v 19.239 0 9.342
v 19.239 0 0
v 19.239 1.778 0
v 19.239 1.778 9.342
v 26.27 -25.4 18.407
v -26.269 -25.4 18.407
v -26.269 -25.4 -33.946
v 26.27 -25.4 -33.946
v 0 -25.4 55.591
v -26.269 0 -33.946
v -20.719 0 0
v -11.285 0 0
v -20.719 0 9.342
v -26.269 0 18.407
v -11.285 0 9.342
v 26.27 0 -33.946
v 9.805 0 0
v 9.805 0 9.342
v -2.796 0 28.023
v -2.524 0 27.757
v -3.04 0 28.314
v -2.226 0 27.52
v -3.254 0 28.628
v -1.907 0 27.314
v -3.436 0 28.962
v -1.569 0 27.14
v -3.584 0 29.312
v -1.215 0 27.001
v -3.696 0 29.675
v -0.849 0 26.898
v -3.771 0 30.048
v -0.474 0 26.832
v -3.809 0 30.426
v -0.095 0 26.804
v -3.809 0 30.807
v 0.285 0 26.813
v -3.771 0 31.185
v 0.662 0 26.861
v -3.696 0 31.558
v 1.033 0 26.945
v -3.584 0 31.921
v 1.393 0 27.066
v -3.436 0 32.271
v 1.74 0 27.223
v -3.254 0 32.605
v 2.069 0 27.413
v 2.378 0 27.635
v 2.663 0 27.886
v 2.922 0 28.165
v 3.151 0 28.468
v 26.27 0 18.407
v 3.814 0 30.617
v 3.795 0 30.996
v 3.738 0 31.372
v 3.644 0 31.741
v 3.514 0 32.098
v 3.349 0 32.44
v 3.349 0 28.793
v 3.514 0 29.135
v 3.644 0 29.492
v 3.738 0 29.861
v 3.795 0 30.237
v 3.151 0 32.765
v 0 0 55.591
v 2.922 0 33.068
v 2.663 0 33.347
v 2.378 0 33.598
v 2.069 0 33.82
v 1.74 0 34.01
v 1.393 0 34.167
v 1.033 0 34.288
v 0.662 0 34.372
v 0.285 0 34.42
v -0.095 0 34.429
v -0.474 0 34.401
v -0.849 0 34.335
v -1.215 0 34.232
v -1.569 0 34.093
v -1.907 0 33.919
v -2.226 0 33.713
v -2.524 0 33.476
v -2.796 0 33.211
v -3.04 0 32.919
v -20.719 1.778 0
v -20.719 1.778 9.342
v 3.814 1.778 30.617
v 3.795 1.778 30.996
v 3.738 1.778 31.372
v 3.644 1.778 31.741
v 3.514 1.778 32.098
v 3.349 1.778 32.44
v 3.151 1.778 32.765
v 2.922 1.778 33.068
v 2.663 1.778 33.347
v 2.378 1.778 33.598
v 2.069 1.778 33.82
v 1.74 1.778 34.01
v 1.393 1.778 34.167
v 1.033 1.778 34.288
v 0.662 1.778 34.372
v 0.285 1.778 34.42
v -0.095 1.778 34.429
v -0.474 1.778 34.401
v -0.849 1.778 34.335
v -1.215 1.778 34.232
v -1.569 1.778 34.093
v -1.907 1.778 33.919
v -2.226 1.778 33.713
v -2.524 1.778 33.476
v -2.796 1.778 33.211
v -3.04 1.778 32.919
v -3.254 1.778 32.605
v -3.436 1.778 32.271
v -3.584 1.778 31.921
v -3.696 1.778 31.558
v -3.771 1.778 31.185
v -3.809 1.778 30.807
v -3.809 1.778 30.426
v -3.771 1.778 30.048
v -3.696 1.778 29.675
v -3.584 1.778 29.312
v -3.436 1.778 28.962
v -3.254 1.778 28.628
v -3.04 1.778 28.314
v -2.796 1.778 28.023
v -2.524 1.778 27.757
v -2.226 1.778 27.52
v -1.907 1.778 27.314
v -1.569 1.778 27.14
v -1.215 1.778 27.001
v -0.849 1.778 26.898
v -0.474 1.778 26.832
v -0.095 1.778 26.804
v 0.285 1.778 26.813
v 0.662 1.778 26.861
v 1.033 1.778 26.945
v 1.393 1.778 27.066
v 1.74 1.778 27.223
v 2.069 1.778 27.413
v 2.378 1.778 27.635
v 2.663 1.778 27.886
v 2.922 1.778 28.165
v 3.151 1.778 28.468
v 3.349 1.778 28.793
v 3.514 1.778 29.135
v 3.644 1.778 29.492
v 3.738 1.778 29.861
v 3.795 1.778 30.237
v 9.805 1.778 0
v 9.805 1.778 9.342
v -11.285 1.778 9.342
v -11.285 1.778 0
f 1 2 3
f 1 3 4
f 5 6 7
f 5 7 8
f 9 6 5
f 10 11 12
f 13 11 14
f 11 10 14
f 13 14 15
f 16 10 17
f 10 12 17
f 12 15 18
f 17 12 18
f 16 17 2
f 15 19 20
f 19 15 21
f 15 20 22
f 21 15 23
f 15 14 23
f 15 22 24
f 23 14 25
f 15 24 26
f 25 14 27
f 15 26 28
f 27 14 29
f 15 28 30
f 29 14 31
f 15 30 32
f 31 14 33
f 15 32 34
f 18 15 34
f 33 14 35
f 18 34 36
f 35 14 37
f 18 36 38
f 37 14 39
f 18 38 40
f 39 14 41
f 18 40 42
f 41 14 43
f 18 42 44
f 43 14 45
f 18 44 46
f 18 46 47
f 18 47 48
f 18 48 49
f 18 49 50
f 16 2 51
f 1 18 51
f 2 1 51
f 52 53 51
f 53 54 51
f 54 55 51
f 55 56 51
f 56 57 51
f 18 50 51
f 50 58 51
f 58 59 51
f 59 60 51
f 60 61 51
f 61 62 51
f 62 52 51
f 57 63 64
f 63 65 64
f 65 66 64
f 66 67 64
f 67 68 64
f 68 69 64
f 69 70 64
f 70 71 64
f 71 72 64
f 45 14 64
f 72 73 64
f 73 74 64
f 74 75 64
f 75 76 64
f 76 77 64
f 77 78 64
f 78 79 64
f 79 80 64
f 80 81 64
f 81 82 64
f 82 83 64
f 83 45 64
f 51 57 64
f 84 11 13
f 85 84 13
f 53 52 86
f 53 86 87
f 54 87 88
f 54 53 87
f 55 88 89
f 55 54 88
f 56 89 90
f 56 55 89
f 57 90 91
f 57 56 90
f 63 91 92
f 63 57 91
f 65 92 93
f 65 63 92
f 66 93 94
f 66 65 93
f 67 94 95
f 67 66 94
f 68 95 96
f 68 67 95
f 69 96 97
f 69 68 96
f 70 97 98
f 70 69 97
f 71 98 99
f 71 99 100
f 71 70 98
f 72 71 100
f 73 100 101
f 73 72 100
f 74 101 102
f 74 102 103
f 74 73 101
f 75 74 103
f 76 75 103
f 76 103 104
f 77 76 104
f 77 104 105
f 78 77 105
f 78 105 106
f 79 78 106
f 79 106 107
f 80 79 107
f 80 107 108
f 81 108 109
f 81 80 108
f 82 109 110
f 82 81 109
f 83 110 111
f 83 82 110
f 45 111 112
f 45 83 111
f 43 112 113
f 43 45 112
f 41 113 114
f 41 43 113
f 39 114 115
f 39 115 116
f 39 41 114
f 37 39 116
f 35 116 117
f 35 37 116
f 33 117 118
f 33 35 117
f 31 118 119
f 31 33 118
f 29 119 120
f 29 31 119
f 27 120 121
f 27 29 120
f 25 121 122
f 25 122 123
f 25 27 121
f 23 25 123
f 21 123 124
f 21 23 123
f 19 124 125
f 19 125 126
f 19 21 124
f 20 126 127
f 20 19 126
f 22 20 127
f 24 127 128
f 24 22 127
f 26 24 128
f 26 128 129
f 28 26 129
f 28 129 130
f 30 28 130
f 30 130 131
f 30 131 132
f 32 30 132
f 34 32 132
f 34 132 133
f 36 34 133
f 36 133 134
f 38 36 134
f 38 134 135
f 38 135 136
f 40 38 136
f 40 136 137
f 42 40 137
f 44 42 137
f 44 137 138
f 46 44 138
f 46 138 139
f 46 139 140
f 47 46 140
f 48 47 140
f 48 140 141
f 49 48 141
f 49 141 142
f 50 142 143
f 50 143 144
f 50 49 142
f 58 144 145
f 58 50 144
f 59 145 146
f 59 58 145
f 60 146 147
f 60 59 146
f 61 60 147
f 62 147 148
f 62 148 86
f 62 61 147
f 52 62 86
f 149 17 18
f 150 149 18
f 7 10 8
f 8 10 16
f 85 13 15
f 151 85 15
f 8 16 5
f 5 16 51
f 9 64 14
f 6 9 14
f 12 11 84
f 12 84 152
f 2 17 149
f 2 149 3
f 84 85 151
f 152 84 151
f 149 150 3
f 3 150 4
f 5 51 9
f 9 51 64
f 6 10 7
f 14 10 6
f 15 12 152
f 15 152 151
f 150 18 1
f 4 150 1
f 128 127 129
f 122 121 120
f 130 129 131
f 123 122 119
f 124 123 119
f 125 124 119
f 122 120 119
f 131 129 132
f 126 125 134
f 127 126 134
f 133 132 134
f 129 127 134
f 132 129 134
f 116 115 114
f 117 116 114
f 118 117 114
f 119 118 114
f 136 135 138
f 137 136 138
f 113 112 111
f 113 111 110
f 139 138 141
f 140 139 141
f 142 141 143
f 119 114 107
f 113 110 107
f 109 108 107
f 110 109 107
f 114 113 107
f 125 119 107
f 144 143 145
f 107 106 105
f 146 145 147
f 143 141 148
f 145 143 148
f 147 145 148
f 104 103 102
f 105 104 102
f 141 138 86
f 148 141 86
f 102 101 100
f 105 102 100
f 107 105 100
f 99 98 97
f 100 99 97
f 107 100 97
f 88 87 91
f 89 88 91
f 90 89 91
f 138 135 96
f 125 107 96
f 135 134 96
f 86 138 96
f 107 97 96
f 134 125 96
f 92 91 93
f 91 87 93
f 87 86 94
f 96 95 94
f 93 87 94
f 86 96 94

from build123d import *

# Parameters (mm, degrees)
F0_W     = 52.538685
F0_H     = 52.353366
F2_DEPTH = 25.4
F1_W     = 9.434705
F1_H     = 9.342208
F1_W_2   = 9.434706
F1_R     = 3.813753
F3_DEPTH = 1.778


with BuildPart() as f2:
    # F0 (on Front) → F2 (new body)
    with BuildSketch(Plane.XZ):
        with Locations((0.000164, -7.769757)):
            Rectangle(F0_W, F0_H)
        Polygon((0.000164, 55.590764), (-26.269179, 18.406926), (26.269506, 18.406926), align=None)
    extrude(amount=F2_DEPTH)

    # F1 (on Front) → F3 (join)
    with BuildSketch(Plane.XZ):
        with Locations((-16.002, 4.671104)):
            Rectangle(F1_W, F1_H)
        with Locations((14.522046, 4.671104)):
            Rectangle(F1_W_2, F1_H)
        with Locations((0, 30.616544)):
            Circle(F1_R)
    extrude(amount=-F3_DEPTH)


solid = f2.part
